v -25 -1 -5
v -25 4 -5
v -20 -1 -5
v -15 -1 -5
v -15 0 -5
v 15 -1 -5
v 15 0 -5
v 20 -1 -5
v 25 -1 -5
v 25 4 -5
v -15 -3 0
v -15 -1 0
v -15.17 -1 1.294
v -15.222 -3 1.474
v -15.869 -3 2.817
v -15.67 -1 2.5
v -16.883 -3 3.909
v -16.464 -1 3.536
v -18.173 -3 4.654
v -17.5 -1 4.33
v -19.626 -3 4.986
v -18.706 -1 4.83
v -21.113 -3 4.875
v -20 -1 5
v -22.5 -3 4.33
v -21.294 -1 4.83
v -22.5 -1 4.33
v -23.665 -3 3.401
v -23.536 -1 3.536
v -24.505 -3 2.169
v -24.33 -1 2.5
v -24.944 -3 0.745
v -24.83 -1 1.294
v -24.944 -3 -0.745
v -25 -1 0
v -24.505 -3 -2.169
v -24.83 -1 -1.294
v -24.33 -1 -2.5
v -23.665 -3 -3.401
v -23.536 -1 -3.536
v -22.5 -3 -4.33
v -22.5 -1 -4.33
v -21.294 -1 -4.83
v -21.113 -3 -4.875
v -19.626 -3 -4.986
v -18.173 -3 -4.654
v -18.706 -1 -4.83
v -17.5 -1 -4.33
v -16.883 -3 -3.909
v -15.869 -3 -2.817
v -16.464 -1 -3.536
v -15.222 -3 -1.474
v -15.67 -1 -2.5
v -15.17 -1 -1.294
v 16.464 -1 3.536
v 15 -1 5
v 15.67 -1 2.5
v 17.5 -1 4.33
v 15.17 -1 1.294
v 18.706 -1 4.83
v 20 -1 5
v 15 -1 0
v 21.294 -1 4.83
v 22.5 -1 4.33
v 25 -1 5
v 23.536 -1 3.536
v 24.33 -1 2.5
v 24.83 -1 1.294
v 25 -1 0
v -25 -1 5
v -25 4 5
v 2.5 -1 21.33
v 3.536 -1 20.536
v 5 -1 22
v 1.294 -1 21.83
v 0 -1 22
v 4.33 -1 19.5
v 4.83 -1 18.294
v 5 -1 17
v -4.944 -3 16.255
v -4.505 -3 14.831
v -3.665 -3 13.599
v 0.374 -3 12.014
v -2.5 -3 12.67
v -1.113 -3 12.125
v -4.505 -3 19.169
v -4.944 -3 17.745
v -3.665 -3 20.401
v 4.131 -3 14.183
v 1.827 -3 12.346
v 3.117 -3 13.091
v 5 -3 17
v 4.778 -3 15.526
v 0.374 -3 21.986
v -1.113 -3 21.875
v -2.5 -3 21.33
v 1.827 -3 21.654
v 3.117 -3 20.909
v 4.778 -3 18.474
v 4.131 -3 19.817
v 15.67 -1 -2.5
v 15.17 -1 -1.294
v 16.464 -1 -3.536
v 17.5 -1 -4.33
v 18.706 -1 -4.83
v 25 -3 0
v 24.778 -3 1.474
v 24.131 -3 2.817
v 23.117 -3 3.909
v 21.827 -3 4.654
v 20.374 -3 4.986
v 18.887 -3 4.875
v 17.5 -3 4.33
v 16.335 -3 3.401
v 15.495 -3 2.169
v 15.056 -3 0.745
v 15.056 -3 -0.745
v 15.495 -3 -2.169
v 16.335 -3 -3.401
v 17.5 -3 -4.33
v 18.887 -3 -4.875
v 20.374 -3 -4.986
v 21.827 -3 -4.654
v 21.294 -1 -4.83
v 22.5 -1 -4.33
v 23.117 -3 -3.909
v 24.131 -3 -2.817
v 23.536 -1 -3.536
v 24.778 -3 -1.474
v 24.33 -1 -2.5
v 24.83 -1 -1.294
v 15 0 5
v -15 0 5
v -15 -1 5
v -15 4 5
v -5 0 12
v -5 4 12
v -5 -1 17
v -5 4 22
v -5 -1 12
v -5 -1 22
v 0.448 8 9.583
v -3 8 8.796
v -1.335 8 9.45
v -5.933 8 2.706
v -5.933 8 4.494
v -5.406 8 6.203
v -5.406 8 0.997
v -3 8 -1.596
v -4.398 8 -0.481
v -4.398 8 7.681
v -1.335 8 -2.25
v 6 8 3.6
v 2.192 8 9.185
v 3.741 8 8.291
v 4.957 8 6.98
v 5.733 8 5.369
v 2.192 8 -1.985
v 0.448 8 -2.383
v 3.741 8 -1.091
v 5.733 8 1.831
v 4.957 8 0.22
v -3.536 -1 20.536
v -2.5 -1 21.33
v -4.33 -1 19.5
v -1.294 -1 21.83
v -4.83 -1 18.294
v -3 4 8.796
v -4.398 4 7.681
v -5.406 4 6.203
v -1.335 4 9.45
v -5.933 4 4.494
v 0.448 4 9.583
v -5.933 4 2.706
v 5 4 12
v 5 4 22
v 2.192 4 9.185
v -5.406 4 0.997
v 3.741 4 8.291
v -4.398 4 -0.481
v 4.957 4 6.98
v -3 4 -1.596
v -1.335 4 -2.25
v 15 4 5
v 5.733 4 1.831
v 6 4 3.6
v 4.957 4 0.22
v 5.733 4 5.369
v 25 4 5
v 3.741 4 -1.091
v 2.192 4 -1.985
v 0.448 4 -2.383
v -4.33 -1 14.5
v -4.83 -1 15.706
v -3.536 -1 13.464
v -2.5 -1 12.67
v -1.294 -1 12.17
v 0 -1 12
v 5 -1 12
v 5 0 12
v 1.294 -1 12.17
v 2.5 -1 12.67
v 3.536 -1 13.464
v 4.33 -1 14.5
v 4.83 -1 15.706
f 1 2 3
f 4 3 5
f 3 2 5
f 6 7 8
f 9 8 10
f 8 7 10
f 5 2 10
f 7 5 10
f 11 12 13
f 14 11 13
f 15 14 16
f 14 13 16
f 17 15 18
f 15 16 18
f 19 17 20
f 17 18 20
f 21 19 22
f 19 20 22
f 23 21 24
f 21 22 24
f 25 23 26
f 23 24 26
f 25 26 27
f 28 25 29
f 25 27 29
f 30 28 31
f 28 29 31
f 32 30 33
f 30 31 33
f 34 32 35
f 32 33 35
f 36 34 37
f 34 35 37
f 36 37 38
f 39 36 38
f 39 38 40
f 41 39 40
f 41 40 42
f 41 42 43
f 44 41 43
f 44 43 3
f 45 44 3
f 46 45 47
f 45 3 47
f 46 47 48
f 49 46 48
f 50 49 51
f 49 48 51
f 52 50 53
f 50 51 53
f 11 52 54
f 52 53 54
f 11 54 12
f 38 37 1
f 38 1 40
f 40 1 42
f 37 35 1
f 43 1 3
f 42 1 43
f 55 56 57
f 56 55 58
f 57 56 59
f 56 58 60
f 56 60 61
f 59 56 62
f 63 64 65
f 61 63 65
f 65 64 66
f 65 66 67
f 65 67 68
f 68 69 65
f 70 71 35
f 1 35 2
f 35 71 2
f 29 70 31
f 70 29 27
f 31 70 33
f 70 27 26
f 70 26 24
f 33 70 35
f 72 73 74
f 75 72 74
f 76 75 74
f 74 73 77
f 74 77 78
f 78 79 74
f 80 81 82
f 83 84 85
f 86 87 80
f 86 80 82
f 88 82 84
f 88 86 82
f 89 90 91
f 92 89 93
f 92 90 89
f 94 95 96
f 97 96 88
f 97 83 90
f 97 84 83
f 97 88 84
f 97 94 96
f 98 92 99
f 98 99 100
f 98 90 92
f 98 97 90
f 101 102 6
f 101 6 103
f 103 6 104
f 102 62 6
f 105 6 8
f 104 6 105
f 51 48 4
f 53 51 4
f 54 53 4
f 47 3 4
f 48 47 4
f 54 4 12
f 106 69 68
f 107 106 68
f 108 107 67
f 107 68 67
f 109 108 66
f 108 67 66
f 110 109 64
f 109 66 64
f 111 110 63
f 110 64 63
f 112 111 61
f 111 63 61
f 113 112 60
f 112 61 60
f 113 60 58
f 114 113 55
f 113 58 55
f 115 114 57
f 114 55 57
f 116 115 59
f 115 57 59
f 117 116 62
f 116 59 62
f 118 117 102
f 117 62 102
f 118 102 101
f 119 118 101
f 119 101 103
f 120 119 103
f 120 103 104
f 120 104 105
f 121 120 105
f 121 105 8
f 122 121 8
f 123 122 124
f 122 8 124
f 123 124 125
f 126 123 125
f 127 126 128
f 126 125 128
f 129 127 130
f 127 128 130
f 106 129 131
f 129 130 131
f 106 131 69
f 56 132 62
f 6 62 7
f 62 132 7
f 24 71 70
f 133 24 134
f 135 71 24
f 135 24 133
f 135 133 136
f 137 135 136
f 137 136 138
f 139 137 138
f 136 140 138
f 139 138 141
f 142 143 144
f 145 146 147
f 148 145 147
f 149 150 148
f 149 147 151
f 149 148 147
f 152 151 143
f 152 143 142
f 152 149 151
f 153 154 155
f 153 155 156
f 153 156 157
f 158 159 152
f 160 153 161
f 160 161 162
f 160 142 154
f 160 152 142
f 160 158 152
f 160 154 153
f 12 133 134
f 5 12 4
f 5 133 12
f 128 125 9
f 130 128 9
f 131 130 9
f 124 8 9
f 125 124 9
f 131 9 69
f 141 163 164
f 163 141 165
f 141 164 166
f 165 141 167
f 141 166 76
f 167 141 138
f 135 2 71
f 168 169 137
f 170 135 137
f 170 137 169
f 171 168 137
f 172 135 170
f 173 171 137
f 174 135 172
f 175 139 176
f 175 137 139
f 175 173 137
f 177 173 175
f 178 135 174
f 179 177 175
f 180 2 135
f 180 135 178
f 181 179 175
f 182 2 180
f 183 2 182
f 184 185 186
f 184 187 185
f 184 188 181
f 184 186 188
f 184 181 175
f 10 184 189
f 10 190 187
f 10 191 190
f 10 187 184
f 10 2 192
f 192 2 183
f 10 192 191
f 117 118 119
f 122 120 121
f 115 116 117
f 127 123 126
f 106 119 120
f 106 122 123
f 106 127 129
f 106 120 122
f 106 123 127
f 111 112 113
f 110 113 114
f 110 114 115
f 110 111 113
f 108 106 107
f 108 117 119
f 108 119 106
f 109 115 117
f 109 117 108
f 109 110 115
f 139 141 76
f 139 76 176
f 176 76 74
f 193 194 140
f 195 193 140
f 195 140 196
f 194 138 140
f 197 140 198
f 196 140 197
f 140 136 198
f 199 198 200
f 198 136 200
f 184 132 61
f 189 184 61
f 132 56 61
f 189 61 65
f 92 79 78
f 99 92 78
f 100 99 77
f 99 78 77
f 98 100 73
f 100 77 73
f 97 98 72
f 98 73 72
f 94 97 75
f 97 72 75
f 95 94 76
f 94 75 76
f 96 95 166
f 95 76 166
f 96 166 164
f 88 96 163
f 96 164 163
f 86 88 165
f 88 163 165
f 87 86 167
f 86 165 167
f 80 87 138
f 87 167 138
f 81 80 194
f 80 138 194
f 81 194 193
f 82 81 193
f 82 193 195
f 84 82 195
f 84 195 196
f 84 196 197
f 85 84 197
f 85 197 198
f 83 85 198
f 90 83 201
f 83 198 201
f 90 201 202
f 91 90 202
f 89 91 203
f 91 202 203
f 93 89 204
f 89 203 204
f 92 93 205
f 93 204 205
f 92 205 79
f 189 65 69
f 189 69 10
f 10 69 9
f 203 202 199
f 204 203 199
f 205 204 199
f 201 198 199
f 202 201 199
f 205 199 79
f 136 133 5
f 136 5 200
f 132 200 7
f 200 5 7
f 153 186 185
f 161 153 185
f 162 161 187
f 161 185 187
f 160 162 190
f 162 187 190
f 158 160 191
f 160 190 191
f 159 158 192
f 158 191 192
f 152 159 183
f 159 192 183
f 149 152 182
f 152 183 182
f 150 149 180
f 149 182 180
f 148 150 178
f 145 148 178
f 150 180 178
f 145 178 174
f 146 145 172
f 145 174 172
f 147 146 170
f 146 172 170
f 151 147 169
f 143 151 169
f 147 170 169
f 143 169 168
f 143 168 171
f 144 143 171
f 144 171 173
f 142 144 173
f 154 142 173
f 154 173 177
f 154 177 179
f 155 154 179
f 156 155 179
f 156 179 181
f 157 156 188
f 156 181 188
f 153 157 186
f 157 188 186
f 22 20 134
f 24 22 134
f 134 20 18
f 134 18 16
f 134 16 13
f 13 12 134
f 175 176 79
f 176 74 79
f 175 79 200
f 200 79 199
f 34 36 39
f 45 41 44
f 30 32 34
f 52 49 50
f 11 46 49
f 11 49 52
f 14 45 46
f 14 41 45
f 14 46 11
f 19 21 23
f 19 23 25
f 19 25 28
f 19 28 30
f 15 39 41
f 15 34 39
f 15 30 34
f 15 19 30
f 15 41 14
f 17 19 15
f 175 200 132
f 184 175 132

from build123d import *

# Parameters (mm, degrees)
EXTRUDE_1_DEPTH = 4
SKETCH_1_W      = 10
SKETCH_1_H      = 10
EXTRUDE_2_DEPTH = 1
SKETCH_5_R      = 6
EXTRUDE_3_DEPTH = 4
SKETCH_6_R      = 5
EXTRUDE_4_DEPTH = 2


with BuildPart() as part:
    # 草图2 → 凸台-拉伸1 (new body)
    with BuildSketch(Plane(origin=(0, 0, 0), x_dir=(1, 0, 0), z_dir=(0, 1, 0))):
        Polygon((-5, -22), (5, -22), (5, -12), (15, -5), (25, -5), (25, 5), (-25, 5), (-25, -5), (-15, -5), (-5, -12), align=None)
    extrude(amount=EXTRUDE_1_DEPTH)

    # 草图1 → 凸台-拉伸2 (add)
    with BuildSketch(Plane(origin=(0, 0, 0), x_dir=(1, 0, 0), z_dir=(0, 1, 0))):
        with Locations((-20, 0)):
            Rectangle(SKETCH_1_W, SKETCH_1_H)
        with Locations((20, 0)):
            Rectangle(SKETCH_1_W, SKETCH_1_H)
        with Locations((0, -17)):
            Rectangle(SKETCH_1_W, SKETCH_1_H)
    extrude(amount=-EXTRUDE_2_DEPTH)

    # 草图5 → 凸台-拉伸3 (add)
    with BuildSketch(Plane(origin=(0, 4, 0), x_dir=(1, 0, 0), z_dir=(0, 1, 0))):
        with Locations((0, -3.6)):
            Circle(SKETCH_5_R)
    extrude(amount=EXTRUDE_3_DEPTH)

    # 草图6 → 凸台-拉伸4 (add)
    with BuildSketch(Plane.XZ.offset(1)):
        with Locations((0, 17)):
            Circle(SKETCH_6_R)
        with Locations((20, 0)):
            Circle(SKETCH_6_R)
        with Locations((-20, 0)):
            Circle(SKETCH_6_R)
    extrude(amount=EXTRUDE_4_DEPTH)


solid = part.part
